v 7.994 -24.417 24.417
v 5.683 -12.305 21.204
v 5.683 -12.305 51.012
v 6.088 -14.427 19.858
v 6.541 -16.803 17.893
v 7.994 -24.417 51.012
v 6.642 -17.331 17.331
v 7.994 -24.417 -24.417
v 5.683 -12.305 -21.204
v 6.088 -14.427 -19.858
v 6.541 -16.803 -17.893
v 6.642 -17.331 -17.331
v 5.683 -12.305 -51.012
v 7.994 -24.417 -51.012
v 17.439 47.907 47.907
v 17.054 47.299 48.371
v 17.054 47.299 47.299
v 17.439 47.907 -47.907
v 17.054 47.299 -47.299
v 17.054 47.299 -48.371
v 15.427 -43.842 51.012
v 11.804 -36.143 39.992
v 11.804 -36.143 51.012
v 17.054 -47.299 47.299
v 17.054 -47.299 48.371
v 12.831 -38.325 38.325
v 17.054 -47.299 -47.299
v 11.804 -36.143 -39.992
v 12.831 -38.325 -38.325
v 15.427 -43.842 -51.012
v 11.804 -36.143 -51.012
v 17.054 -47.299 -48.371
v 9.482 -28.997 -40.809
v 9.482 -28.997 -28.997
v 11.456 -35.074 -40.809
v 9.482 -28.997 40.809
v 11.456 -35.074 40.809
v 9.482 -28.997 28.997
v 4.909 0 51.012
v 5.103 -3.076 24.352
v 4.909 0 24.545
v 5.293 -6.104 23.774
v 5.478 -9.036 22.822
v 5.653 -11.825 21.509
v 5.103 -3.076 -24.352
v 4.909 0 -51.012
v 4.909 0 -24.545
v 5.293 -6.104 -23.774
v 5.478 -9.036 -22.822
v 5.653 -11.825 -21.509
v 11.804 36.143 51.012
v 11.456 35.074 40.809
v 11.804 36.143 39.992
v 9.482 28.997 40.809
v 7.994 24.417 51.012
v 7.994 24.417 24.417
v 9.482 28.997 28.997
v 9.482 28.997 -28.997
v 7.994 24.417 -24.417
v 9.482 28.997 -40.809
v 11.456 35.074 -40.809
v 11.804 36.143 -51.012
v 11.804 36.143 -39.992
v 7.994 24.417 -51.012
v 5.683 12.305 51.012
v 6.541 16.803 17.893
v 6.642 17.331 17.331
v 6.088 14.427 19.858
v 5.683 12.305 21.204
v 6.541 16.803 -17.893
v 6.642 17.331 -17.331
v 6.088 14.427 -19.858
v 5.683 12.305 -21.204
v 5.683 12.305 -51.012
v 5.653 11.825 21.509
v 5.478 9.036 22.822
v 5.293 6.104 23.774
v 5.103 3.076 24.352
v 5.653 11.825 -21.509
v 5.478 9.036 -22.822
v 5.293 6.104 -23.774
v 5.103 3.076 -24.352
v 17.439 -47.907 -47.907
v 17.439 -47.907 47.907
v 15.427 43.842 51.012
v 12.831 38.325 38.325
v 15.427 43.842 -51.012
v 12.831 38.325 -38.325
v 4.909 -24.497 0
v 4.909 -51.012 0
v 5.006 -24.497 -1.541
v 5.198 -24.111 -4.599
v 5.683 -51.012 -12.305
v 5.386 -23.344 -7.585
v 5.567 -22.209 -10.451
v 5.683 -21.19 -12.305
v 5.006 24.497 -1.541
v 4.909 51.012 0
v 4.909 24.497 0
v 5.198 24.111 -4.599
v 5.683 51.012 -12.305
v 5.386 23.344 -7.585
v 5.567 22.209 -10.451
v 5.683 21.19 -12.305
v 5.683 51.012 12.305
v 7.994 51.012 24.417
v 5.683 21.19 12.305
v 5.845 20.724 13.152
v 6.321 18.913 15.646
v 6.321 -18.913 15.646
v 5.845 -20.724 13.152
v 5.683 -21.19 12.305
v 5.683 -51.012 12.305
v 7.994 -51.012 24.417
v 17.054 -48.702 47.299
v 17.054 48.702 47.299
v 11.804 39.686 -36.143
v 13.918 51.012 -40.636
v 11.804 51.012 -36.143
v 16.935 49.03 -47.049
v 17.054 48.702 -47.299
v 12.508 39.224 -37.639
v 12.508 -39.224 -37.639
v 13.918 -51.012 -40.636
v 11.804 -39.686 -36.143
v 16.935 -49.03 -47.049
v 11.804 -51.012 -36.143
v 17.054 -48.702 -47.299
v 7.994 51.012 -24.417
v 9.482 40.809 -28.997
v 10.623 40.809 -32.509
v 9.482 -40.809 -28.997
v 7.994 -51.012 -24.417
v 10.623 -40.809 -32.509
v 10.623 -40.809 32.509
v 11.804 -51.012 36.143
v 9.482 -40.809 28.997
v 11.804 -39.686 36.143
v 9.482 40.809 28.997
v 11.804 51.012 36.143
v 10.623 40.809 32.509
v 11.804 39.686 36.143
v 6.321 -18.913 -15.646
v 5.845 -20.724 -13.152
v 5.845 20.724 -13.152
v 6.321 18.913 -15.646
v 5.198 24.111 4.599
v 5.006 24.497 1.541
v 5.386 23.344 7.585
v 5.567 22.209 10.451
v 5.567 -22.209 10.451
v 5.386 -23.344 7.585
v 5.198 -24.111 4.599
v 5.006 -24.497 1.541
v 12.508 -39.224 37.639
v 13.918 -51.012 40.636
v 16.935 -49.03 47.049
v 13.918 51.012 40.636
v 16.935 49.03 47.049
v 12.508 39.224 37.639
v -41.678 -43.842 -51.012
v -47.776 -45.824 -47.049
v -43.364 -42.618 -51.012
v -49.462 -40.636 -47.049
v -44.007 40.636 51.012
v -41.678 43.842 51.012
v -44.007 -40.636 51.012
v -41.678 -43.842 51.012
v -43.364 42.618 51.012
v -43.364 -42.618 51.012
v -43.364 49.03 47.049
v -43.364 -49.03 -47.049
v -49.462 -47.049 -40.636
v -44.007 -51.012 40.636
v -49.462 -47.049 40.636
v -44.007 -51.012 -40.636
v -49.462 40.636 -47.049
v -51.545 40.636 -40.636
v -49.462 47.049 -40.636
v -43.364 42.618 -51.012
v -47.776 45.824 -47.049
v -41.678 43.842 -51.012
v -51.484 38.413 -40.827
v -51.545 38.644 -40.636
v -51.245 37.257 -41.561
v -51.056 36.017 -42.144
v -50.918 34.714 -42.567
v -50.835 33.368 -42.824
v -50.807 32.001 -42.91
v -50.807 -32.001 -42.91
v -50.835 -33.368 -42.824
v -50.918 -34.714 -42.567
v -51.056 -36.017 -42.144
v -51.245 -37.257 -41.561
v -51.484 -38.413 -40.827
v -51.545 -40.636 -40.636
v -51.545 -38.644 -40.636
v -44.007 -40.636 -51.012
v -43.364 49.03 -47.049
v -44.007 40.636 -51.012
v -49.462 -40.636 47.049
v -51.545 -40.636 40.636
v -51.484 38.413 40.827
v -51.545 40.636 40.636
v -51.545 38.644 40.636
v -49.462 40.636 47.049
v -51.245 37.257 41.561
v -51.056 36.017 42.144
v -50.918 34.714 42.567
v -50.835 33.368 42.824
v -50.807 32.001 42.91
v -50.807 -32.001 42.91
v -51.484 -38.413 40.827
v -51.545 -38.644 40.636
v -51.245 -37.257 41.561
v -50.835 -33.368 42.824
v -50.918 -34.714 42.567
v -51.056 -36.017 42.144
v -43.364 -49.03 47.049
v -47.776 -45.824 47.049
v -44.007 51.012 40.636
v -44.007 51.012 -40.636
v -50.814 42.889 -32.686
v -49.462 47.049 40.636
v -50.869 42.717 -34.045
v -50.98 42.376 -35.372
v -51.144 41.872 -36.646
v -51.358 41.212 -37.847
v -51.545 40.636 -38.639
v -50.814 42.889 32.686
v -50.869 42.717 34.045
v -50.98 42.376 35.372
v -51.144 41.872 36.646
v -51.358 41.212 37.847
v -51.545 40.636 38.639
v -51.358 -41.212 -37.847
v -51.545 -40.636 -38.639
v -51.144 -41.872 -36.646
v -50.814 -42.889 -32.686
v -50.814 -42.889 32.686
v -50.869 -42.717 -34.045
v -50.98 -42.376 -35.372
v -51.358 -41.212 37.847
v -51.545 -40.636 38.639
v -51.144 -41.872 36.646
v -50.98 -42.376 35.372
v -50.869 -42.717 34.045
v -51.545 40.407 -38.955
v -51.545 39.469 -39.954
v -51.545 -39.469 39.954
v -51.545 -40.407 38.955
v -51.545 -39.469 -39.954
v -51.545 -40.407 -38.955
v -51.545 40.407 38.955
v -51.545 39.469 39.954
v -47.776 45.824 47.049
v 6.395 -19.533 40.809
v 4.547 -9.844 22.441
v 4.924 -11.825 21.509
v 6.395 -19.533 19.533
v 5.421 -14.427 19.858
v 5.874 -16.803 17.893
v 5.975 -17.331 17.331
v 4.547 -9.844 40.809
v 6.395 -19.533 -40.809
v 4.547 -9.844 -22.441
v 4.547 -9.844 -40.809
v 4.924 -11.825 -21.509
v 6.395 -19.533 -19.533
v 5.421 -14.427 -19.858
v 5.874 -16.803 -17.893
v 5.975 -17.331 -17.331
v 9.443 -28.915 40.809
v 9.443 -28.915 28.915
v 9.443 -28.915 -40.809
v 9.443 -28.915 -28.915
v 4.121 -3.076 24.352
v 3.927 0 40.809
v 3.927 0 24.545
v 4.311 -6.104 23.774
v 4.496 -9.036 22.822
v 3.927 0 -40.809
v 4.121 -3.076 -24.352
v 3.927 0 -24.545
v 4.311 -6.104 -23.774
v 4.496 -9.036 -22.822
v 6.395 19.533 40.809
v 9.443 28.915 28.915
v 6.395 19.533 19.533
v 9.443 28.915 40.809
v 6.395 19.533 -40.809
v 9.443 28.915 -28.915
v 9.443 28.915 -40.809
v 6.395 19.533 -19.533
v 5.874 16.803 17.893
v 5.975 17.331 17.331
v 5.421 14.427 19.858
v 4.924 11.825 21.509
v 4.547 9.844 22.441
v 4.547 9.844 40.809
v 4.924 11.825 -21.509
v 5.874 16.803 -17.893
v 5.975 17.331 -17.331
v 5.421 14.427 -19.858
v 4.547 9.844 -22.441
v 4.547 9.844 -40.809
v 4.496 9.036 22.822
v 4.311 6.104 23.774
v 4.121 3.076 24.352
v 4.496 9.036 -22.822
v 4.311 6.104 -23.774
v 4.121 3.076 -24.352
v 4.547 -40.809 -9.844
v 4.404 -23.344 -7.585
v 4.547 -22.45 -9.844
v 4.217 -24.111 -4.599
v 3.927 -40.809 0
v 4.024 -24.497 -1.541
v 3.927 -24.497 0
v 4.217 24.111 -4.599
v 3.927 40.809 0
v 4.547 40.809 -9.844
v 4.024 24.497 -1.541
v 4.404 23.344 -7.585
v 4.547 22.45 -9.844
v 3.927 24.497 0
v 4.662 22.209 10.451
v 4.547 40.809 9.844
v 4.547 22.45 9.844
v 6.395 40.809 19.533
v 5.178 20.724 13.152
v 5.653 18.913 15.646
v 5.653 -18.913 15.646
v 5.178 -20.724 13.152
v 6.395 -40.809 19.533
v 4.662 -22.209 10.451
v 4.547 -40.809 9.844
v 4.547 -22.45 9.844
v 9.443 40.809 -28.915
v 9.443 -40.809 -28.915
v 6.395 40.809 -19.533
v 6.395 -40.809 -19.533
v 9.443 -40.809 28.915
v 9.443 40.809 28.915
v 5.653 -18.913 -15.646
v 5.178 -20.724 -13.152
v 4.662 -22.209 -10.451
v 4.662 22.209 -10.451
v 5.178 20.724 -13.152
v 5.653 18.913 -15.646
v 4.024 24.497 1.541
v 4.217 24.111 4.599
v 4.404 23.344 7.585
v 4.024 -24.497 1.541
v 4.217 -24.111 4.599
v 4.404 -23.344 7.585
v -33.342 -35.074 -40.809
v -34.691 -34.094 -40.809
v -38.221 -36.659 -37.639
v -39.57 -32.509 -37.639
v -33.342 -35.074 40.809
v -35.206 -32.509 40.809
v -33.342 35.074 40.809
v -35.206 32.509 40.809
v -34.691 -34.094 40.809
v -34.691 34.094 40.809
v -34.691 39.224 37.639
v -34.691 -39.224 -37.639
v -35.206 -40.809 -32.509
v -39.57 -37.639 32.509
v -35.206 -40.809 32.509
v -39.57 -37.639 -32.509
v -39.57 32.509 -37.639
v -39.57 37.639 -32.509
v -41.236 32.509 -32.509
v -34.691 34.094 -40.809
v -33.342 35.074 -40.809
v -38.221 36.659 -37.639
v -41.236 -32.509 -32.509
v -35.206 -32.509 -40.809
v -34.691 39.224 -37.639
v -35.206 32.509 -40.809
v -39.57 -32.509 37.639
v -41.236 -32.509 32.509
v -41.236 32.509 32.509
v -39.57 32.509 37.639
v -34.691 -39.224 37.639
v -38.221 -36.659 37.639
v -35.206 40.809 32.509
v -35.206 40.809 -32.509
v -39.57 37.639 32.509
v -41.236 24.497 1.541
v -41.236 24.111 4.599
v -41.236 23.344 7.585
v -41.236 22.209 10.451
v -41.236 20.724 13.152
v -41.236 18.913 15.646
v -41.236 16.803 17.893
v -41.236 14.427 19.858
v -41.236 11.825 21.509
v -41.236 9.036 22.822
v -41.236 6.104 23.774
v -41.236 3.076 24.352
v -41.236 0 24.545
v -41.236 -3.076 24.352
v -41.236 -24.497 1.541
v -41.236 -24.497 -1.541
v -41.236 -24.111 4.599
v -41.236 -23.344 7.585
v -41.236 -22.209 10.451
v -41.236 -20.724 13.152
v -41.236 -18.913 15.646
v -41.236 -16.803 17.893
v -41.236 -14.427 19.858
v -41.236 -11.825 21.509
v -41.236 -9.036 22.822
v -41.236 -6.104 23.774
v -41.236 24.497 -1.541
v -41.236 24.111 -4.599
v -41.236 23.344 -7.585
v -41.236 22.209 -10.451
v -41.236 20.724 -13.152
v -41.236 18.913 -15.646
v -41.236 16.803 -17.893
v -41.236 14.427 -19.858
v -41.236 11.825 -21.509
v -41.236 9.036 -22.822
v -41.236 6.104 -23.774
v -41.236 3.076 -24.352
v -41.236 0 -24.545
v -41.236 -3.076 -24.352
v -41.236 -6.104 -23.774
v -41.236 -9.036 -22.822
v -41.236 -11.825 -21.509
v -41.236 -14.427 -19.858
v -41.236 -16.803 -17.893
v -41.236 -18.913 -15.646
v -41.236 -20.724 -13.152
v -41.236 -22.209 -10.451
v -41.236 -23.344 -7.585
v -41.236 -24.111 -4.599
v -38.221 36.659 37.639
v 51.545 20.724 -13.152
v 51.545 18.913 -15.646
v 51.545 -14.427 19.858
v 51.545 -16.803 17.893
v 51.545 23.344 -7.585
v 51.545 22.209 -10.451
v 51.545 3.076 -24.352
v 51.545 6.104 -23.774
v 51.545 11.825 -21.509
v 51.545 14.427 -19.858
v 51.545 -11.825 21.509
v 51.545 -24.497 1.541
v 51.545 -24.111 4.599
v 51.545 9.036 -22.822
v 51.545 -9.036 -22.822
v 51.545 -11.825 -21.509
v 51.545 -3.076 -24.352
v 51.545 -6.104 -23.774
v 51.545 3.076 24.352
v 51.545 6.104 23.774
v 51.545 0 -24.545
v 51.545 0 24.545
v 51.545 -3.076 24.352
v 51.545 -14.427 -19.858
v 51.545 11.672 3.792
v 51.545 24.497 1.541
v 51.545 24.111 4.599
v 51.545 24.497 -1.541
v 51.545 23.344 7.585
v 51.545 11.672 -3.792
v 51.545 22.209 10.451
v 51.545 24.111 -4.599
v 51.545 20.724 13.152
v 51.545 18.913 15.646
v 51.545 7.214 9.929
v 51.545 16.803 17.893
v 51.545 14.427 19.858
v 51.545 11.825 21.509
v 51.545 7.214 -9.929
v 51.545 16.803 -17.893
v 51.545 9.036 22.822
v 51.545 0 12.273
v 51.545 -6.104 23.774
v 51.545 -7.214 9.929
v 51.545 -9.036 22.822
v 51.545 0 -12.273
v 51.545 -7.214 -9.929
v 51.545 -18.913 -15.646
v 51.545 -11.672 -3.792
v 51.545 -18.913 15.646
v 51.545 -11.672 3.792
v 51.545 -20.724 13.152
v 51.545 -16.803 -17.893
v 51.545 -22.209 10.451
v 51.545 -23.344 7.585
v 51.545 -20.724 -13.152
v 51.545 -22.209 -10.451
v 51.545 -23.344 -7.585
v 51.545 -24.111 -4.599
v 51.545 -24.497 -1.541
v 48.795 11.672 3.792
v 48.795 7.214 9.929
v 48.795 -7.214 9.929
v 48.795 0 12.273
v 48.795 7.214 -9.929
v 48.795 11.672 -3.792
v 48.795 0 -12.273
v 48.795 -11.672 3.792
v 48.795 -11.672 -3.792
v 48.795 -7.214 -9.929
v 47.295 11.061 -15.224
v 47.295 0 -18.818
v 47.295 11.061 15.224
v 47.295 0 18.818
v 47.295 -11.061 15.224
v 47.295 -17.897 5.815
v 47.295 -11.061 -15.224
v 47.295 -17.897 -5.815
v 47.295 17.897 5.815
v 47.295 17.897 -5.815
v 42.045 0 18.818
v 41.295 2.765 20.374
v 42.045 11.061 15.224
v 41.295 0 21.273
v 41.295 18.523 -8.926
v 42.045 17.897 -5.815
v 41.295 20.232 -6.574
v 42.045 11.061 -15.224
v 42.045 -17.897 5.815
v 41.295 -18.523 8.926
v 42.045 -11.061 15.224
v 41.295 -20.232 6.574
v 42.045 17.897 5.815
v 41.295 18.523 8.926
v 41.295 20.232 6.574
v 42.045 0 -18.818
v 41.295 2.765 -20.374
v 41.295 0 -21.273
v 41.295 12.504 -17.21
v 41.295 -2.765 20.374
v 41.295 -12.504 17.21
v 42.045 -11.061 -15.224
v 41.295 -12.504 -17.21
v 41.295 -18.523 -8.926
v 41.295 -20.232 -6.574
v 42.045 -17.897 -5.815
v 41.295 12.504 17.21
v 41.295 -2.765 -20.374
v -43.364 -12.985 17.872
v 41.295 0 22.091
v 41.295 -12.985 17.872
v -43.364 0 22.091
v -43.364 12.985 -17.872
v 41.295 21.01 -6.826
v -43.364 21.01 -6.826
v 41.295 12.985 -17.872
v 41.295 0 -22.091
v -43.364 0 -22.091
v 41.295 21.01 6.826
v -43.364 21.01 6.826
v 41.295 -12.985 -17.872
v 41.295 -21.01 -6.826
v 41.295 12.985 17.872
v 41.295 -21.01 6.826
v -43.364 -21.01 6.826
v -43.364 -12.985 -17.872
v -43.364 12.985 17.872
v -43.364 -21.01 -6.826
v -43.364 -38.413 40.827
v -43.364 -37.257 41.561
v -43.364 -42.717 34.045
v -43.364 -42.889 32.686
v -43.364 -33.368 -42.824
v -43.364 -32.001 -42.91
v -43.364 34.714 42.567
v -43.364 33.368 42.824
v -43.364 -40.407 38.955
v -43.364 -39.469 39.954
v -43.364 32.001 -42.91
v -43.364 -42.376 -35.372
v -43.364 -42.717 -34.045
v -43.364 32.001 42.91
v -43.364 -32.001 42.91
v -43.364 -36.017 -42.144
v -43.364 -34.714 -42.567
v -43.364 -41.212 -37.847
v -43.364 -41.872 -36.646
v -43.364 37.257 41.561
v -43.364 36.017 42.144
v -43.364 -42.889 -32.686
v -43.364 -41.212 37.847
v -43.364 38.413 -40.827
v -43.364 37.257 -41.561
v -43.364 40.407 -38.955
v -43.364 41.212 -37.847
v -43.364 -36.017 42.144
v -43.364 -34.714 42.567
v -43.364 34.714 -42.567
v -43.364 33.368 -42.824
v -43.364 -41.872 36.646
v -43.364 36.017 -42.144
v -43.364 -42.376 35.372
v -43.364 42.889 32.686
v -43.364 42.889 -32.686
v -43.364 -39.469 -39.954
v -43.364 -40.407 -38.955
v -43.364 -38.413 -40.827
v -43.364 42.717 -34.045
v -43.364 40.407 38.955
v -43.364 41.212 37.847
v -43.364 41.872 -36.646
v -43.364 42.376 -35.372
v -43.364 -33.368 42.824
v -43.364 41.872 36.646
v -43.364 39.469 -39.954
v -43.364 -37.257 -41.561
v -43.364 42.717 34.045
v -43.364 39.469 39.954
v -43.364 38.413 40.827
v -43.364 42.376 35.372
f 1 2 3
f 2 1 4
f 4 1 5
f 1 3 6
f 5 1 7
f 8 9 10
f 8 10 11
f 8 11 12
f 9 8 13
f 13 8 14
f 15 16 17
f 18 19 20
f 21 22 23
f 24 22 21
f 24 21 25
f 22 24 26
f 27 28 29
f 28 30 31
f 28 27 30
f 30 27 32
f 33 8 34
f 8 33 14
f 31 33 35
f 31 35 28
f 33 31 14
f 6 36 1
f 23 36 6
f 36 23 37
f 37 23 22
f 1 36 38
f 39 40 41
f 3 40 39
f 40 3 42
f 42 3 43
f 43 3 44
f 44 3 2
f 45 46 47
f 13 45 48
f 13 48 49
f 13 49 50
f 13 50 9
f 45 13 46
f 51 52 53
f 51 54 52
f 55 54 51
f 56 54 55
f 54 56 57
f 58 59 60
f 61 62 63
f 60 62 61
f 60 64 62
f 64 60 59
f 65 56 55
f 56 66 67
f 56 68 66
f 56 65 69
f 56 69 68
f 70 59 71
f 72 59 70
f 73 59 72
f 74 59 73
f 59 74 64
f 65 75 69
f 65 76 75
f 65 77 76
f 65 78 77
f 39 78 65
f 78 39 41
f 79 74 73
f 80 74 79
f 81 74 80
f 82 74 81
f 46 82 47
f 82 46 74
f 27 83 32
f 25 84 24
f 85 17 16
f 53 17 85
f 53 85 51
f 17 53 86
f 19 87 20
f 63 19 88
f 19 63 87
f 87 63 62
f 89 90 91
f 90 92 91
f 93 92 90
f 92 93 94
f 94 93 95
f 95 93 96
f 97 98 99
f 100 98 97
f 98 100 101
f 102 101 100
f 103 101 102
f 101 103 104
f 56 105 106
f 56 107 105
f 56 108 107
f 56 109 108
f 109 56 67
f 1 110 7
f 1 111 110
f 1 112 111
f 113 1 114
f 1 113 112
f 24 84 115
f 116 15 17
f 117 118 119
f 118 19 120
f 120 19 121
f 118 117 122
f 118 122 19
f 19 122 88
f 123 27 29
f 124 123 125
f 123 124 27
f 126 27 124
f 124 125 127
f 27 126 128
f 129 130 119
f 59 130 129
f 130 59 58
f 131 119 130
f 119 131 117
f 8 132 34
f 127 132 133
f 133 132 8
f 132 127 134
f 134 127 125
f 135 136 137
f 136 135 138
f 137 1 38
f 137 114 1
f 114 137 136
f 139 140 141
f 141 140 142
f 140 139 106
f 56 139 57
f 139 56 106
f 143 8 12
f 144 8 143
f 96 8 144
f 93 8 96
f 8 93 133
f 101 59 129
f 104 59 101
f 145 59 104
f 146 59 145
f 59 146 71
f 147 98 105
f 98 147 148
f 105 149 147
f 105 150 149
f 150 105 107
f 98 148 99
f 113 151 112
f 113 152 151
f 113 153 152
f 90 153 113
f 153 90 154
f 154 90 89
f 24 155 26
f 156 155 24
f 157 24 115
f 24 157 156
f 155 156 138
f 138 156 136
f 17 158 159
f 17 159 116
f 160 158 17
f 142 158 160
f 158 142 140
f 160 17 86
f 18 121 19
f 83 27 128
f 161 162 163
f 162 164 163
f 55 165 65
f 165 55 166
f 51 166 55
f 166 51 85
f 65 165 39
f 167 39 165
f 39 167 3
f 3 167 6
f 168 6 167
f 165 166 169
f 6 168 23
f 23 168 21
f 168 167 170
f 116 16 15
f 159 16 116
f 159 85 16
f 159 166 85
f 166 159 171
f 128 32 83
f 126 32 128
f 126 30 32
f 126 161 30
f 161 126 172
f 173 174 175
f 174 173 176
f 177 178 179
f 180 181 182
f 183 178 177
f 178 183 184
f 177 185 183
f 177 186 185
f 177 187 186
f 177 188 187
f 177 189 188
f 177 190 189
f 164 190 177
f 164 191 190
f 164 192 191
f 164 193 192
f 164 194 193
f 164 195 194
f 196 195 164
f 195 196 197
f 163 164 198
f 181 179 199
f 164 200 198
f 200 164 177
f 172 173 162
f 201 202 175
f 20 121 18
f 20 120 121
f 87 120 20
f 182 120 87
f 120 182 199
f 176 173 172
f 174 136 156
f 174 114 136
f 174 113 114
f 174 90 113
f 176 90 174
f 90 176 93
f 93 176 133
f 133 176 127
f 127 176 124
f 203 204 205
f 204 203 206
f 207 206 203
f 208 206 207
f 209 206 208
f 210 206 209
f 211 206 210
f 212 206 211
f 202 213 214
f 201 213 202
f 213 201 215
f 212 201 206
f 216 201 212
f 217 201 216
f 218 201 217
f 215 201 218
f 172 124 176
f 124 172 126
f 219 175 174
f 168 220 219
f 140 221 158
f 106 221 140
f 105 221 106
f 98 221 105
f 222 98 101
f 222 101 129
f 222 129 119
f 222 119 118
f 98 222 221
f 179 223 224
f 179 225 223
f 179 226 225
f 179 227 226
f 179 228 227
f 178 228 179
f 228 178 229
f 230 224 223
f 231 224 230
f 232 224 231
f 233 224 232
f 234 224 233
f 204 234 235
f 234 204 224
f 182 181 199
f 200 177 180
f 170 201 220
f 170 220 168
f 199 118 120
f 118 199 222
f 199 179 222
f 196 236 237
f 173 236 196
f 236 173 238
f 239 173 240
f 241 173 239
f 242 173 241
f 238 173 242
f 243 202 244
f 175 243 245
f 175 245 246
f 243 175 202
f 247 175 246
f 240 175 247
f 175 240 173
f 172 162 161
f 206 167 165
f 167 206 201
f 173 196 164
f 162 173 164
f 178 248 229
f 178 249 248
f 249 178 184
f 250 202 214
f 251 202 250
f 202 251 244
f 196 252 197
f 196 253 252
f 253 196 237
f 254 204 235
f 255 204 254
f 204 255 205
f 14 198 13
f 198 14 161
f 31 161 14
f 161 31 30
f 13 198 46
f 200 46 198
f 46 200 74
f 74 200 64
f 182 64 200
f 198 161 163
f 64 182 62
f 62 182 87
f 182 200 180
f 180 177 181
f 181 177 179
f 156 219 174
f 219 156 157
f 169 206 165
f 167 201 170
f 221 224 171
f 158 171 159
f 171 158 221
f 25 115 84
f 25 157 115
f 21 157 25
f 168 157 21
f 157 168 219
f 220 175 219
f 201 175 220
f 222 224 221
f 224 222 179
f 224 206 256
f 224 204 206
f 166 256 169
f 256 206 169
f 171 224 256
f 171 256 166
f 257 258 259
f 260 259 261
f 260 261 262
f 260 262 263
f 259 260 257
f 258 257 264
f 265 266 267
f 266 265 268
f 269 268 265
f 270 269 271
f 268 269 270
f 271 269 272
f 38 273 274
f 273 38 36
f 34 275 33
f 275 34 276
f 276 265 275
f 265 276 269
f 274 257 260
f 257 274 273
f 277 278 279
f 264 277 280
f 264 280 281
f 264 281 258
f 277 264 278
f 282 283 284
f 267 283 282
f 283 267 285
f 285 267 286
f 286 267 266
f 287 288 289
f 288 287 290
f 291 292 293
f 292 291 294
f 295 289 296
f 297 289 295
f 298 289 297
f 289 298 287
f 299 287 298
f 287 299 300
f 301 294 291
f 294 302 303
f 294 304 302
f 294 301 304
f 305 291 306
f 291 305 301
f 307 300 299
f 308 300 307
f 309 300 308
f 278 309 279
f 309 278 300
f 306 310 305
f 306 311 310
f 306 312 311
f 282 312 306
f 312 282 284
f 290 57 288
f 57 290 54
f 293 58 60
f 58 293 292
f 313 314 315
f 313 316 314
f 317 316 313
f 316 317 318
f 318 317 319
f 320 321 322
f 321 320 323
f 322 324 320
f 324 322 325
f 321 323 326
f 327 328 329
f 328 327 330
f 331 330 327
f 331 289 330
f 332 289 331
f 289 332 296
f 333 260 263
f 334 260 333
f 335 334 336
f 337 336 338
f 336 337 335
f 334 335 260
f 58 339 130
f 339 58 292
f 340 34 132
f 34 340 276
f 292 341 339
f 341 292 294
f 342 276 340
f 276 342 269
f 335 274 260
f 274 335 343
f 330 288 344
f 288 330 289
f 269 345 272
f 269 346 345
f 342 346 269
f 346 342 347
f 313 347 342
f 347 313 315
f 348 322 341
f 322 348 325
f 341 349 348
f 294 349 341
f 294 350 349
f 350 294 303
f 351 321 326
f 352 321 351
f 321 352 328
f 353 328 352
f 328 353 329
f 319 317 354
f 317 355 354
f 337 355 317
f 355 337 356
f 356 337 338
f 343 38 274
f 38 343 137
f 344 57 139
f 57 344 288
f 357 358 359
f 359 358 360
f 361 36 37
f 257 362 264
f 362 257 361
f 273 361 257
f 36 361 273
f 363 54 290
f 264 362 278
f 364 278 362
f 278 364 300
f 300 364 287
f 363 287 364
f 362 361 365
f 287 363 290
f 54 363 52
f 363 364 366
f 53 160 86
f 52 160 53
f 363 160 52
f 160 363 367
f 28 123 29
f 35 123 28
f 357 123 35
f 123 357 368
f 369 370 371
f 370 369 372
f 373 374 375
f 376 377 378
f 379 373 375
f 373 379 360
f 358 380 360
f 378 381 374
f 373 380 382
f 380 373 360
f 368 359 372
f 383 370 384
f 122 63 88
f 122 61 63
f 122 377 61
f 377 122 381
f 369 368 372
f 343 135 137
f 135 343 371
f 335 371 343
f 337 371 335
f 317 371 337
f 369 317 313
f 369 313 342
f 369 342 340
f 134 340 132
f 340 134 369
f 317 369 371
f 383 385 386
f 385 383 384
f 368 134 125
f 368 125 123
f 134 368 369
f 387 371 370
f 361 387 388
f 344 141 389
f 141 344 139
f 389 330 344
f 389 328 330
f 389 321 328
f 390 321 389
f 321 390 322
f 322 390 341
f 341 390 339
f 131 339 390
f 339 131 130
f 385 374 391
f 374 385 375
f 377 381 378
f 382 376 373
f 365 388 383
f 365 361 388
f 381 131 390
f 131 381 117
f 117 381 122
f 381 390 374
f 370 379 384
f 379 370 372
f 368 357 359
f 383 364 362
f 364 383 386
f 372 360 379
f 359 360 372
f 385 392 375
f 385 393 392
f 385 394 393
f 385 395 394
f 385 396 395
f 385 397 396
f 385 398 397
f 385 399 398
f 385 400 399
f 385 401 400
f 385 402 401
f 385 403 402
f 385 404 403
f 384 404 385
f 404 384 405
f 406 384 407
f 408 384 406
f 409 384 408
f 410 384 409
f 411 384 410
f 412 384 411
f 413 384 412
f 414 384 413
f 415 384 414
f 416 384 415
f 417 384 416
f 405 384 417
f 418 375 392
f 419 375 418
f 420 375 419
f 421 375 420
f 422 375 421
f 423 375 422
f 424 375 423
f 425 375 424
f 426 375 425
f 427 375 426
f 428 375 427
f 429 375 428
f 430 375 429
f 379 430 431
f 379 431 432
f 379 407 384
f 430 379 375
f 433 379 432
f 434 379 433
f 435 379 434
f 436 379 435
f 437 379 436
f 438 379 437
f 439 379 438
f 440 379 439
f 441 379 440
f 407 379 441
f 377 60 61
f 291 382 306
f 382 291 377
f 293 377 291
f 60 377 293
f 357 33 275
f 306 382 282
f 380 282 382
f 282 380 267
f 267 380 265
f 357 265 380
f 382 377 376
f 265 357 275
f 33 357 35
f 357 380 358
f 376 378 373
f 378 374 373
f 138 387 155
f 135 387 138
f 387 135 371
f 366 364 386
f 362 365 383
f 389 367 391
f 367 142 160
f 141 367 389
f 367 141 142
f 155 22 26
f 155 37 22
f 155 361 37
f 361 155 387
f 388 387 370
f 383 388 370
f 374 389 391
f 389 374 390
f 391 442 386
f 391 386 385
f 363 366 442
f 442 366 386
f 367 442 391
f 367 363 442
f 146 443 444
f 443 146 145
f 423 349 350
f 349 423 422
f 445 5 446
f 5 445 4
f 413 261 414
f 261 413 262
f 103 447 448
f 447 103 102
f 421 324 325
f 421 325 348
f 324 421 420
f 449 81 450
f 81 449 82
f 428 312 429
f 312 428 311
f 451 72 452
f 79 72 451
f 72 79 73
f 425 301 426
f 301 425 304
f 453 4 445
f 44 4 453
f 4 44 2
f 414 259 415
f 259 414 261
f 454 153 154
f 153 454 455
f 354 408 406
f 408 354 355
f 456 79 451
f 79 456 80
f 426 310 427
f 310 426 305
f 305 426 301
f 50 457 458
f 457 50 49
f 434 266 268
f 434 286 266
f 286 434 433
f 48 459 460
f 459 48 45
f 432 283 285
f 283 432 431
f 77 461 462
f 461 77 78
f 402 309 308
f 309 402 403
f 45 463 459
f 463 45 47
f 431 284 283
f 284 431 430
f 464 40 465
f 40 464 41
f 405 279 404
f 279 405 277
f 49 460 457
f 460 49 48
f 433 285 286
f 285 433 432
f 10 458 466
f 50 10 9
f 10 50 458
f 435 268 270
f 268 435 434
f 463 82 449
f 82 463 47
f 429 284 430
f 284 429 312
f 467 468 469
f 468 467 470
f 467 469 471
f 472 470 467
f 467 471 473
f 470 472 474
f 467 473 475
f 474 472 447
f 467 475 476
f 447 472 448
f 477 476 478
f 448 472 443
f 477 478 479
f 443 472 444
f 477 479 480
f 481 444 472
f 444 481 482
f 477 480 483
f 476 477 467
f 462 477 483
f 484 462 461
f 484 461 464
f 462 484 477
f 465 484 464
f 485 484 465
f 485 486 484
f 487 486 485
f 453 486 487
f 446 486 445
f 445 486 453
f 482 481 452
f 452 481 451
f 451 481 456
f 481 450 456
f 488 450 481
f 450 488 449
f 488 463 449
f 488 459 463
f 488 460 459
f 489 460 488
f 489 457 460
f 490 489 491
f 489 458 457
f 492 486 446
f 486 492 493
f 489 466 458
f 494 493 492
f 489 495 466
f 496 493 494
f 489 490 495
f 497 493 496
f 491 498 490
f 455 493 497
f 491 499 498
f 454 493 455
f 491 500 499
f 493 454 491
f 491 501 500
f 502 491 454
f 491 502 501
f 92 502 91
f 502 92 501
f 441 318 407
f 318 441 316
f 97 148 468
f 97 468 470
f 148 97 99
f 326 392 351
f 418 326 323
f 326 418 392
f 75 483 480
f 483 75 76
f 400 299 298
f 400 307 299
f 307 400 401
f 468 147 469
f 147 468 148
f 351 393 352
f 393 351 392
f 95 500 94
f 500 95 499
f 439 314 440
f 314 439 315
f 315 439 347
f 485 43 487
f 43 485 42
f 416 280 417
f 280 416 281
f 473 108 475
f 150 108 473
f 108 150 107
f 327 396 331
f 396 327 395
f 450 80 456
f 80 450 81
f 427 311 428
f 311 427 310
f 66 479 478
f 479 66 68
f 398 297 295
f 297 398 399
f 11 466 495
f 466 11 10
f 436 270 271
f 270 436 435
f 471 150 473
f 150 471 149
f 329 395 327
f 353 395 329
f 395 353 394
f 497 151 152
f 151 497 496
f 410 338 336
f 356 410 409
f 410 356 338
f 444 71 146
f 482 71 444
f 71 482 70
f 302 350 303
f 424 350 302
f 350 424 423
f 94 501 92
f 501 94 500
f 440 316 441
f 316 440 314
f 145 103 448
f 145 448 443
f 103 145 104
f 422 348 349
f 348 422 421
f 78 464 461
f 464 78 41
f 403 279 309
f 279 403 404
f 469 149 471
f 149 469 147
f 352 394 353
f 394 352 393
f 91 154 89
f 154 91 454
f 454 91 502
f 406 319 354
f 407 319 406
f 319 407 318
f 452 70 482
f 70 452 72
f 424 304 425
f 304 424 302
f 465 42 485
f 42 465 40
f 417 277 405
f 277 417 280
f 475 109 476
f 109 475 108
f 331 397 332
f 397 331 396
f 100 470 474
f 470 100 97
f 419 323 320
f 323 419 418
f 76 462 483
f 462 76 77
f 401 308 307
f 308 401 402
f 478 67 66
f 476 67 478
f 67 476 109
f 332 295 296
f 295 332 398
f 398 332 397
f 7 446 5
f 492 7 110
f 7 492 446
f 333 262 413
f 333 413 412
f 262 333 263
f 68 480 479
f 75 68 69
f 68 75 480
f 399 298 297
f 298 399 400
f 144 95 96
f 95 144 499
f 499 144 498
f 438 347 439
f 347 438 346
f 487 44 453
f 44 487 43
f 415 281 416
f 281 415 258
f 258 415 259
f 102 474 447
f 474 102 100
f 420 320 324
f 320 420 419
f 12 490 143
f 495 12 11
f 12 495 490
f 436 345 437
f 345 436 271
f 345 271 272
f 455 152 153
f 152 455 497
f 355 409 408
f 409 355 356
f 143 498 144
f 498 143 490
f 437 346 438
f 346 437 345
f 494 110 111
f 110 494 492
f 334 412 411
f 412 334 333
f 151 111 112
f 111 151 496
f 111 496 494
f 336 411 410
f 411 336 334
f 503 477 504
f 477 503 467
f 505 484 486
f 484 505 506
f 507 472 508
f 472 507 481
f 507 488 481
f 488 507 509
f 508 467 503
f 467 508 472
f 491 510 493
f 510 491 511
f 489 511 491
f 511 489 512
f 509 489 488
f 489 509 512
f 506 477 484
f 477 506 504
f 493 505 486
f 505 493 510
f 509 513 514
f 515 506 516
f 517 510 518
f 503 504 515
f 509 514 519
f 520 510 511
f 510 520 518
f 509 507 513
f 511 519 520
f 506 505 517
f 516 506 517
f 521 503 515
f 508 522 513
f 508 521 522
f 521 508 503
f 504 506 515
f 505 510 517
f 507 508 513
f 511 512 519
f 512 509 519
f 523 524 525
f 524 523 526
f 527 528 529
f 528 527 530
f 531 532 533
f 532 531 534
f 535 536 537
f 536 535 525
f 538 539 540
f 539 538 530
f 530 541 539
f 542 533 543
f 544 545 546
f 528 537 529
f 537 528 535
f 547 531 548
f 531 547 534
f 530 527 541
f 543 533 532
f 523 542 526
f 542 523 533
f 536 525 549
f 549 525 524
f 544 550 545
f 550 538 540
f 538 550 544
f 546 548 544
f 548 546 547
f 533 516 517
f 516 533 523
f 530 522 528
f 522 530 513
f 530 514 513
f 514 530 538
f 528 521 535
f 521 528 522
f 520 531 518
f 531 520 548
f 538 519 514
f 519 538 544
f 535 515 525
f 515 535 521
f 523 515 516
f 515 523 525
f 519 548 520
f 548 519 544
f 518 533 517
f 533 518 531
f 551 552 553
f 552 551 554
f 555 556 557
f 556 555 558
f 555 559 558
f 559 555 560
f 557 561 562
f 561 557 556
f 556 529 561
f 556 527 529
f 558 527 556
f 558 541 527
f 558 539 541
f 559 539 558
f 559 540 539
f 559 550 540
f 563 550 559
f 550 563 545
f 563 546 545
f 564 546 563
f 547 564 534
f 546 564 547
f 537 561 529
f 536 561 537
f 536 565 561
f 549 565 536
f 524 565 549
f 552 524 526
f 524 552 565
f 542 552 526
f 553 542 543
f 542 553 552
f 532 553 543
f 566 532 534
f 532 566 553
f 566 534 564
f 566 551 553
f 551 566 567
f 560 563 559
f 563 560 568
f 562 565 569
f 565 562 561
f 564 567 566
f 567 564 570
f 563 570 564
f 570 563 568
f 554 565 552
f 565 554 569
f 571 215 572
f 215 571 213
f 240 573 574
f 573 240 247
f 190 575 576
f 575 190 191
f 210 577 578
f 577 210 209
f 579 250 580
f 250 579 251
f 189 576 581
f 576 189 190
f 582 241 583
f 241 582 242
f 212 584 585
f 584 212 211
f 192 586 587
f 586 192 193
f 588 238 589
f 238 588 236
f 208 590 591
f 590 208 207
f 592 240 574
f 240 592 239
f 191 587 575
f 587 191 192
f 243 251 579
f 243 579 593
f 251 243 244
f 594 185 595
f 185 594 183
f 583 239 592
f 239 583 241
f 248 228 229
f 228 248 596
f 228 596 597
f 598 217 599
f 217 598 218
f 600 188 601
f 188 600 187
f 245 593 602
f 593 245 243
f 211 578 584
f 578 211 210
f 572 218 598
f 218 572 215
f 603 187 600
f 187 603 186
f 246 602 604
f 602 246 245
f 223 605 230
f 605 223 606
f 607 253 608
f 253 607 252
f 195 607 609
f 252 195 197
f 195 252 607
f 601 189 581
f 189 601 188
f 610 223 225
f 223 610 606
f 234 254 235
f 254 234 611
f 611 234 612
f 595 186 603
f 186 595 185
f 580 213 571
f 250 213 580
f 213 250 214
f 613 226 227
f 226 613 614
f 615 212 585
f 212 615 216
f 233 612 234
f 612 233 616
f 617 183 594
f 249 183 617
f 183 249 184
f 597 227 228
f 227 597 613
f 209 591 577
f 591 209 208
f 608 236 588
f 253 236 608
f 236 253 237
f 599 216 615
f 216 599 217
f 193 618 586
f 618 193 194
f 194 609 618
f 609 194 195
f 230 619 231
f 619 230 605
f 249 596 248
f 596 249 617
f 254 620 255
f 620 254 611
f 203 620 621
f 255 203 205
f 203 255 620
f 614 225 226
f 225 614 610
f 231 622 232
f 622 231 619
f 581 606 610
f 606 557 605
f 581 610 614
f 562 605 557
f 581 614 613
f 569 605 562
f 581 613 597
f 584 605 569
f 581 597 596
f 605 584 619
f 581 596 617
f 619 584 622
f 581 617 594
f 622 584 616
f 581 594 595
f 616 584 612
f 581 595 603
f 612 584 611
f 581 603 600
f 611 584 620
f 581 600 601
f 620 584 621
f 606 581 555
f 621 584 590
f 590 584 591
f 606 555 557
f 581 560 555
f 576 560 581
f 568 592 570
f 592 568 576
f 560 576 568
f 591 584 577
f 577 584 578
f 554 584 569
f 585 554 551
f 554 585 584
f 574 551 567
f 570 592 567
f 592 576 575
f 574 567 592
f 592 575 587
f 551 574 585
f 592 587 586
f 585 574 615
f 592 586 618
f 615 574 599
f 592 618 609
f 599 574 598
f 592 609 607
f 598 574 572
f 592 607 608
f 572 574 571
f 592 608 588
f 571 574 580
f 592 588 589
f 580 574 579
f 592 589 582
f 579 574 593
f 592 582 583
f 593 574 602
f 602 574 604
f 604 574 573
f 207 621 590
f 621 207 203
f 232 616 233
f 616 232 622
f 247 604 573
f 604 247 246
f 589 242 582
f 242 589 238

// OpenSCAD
// file: variables.scad
$fn=50;

scale_factor = 300/55;

CUBIE=18.9*scale_factor; //total side length of each cube piece (including rounded edges)
CORE=18*scale_factor;
SCREW_TIP=1.5*scale_factor;
SCREW_BODY=2*scale_factor;
SCREW_HEAD=3.8*scale_factor;
INNER=4.5*scale_factor;
SPRING=3.2*scale_factor;
ROUND=2*scale_factor; //radius of rounded edges
DEPTH=6*scale_factor;
RAFT=5*scale_factor;
LAYER=0.3*scale_factor;
GAP=0.25*scale_factor;

core_height = 20 * scale_factor;
core_radius = 3 * scale_factor;

WITH_SUPPORT=false;
WITH_RAFT=false;

inner_cubie=(CUBIE-2*ROUND); //length of each cube before rounded edges

tile_length = inner_cubie*0.75;
tile_height = 1 * scale_factor;

module tile(length, height) {
	translate([-length/2,-length/2,0]) {
		minkowski(){
			translate([0,0,-height/2]) cube([length,length,height]);
			cylinder(r=ROUND,h=height,center=true);
		}
	}
	
}

module cubie() {
    translate([-inner_cubie/2,-inner_cubie/2, -inner_cubie/2])
    minkowski() {
        cube([inner_cubie, inner_cubie, inner_cubie]);
        sphere(r=ROUND, $fn=10);
    }
}

module disc() {
    cylinder(CUBIE, r1=CORE, r2=CORE, $fn=50, center=true);

}

module disc2() {
    cylinder(CUBIE*10, r1=CORE, r2=CORE, $fn=50, center=true);

}

module icore() {
    disc();
    rotate([0,90,0])
        disc();
    rotate([90,0,0])
        disc();
}

module core2() {
    intersection() {
        disc2();
        rotate([0,90,0])
            disc2();
        rotate([90,0,0])
            disc2();
    }
}

module screw() {
    translate([5.2,0,0])
    rotate([0,90,0]) {
        cylinder(11.7,r1=SCREW_BODY,r2=SCREW_BODY,$fn=10,center=true);
        translate([0,0,-11.7/2-1.7/2])
            cylinder(1.7,r1=SCREW_HEAD,r2=SCREW_HEAD,$fn=10,center=true);
        translate([0,0,11.7/2+5.7/2])
            cylinder(5.7,r1=SCREW_TIP,r2=SCREW_TIP,$fn=10,center=true);
    }
}
// main file
include <variables.scad>


module center() 
{
	difference() {
    	difference() 
	    {
	        union() 
	        {
	            difference() {
                
                    difference() 
                    {
                        cubie();
                        translate([CUBIE,0,0])
                            icore();
        
                    }
                    
                    
                    translate([0,0,0])
                    scale([0.8,0.8,0.8])
                    difference() 
                    {
                        cubie();
                        translate([CUBIE,0,0])
                            icore();
        
                    }
                }                
                
	            rotate([0,90,0])
	                cylinder(CUBIE,r1=INNER,r2=INNER,center=true);
	            if (WITH_RAFT)
	                raft();
	        }
	
	        rotate([0,90,0]) 
	        {
	            union() 
	            {
	                cylinder(CUBIE+0.5,r1=SCREW_BODY+GAP,r2=SCREW_BODY+GAP,$fn=10,center=true);
	
	                translate([0,0,CUBIE/2-1/2-3])
	                    cylinder(1.5,r1=SPRING+GAP,r2=SCREW_BODY+GAP,$fn=10,center=true);
	
	
	                translate([0,0,CUBIE/2-1/2-9.5])
	                    cylinder(1,r1=SCREW_HEAD+GAP,r2=SPRING+GAP,$fn=10,center=true);
	
	
	                translate([0,0,-4.25/2])
	                    cylinder(CUBIE-4.25,r1=SPRING+GAP,r2=SPRING+GAP,$fn=10,center=true);
	
	                translate([0,0,-10.5/2])
	                    cylinder(CUBIE-10,r1=SCREW_HEAD+GAP,r2=SCREW_HEAD+GAP,$fn=10,center=true); 
	            }
	        }
	    }
		translate([-CUBIE/2 + tile_height/2,0])
		rotate(v=[0,1,0], a=90)
		tile(tile_length*1.05, tile_height);		
	}
}

/*difference() {
    center();
    translate([-70,15,0])cube(55);
}*/

center();
